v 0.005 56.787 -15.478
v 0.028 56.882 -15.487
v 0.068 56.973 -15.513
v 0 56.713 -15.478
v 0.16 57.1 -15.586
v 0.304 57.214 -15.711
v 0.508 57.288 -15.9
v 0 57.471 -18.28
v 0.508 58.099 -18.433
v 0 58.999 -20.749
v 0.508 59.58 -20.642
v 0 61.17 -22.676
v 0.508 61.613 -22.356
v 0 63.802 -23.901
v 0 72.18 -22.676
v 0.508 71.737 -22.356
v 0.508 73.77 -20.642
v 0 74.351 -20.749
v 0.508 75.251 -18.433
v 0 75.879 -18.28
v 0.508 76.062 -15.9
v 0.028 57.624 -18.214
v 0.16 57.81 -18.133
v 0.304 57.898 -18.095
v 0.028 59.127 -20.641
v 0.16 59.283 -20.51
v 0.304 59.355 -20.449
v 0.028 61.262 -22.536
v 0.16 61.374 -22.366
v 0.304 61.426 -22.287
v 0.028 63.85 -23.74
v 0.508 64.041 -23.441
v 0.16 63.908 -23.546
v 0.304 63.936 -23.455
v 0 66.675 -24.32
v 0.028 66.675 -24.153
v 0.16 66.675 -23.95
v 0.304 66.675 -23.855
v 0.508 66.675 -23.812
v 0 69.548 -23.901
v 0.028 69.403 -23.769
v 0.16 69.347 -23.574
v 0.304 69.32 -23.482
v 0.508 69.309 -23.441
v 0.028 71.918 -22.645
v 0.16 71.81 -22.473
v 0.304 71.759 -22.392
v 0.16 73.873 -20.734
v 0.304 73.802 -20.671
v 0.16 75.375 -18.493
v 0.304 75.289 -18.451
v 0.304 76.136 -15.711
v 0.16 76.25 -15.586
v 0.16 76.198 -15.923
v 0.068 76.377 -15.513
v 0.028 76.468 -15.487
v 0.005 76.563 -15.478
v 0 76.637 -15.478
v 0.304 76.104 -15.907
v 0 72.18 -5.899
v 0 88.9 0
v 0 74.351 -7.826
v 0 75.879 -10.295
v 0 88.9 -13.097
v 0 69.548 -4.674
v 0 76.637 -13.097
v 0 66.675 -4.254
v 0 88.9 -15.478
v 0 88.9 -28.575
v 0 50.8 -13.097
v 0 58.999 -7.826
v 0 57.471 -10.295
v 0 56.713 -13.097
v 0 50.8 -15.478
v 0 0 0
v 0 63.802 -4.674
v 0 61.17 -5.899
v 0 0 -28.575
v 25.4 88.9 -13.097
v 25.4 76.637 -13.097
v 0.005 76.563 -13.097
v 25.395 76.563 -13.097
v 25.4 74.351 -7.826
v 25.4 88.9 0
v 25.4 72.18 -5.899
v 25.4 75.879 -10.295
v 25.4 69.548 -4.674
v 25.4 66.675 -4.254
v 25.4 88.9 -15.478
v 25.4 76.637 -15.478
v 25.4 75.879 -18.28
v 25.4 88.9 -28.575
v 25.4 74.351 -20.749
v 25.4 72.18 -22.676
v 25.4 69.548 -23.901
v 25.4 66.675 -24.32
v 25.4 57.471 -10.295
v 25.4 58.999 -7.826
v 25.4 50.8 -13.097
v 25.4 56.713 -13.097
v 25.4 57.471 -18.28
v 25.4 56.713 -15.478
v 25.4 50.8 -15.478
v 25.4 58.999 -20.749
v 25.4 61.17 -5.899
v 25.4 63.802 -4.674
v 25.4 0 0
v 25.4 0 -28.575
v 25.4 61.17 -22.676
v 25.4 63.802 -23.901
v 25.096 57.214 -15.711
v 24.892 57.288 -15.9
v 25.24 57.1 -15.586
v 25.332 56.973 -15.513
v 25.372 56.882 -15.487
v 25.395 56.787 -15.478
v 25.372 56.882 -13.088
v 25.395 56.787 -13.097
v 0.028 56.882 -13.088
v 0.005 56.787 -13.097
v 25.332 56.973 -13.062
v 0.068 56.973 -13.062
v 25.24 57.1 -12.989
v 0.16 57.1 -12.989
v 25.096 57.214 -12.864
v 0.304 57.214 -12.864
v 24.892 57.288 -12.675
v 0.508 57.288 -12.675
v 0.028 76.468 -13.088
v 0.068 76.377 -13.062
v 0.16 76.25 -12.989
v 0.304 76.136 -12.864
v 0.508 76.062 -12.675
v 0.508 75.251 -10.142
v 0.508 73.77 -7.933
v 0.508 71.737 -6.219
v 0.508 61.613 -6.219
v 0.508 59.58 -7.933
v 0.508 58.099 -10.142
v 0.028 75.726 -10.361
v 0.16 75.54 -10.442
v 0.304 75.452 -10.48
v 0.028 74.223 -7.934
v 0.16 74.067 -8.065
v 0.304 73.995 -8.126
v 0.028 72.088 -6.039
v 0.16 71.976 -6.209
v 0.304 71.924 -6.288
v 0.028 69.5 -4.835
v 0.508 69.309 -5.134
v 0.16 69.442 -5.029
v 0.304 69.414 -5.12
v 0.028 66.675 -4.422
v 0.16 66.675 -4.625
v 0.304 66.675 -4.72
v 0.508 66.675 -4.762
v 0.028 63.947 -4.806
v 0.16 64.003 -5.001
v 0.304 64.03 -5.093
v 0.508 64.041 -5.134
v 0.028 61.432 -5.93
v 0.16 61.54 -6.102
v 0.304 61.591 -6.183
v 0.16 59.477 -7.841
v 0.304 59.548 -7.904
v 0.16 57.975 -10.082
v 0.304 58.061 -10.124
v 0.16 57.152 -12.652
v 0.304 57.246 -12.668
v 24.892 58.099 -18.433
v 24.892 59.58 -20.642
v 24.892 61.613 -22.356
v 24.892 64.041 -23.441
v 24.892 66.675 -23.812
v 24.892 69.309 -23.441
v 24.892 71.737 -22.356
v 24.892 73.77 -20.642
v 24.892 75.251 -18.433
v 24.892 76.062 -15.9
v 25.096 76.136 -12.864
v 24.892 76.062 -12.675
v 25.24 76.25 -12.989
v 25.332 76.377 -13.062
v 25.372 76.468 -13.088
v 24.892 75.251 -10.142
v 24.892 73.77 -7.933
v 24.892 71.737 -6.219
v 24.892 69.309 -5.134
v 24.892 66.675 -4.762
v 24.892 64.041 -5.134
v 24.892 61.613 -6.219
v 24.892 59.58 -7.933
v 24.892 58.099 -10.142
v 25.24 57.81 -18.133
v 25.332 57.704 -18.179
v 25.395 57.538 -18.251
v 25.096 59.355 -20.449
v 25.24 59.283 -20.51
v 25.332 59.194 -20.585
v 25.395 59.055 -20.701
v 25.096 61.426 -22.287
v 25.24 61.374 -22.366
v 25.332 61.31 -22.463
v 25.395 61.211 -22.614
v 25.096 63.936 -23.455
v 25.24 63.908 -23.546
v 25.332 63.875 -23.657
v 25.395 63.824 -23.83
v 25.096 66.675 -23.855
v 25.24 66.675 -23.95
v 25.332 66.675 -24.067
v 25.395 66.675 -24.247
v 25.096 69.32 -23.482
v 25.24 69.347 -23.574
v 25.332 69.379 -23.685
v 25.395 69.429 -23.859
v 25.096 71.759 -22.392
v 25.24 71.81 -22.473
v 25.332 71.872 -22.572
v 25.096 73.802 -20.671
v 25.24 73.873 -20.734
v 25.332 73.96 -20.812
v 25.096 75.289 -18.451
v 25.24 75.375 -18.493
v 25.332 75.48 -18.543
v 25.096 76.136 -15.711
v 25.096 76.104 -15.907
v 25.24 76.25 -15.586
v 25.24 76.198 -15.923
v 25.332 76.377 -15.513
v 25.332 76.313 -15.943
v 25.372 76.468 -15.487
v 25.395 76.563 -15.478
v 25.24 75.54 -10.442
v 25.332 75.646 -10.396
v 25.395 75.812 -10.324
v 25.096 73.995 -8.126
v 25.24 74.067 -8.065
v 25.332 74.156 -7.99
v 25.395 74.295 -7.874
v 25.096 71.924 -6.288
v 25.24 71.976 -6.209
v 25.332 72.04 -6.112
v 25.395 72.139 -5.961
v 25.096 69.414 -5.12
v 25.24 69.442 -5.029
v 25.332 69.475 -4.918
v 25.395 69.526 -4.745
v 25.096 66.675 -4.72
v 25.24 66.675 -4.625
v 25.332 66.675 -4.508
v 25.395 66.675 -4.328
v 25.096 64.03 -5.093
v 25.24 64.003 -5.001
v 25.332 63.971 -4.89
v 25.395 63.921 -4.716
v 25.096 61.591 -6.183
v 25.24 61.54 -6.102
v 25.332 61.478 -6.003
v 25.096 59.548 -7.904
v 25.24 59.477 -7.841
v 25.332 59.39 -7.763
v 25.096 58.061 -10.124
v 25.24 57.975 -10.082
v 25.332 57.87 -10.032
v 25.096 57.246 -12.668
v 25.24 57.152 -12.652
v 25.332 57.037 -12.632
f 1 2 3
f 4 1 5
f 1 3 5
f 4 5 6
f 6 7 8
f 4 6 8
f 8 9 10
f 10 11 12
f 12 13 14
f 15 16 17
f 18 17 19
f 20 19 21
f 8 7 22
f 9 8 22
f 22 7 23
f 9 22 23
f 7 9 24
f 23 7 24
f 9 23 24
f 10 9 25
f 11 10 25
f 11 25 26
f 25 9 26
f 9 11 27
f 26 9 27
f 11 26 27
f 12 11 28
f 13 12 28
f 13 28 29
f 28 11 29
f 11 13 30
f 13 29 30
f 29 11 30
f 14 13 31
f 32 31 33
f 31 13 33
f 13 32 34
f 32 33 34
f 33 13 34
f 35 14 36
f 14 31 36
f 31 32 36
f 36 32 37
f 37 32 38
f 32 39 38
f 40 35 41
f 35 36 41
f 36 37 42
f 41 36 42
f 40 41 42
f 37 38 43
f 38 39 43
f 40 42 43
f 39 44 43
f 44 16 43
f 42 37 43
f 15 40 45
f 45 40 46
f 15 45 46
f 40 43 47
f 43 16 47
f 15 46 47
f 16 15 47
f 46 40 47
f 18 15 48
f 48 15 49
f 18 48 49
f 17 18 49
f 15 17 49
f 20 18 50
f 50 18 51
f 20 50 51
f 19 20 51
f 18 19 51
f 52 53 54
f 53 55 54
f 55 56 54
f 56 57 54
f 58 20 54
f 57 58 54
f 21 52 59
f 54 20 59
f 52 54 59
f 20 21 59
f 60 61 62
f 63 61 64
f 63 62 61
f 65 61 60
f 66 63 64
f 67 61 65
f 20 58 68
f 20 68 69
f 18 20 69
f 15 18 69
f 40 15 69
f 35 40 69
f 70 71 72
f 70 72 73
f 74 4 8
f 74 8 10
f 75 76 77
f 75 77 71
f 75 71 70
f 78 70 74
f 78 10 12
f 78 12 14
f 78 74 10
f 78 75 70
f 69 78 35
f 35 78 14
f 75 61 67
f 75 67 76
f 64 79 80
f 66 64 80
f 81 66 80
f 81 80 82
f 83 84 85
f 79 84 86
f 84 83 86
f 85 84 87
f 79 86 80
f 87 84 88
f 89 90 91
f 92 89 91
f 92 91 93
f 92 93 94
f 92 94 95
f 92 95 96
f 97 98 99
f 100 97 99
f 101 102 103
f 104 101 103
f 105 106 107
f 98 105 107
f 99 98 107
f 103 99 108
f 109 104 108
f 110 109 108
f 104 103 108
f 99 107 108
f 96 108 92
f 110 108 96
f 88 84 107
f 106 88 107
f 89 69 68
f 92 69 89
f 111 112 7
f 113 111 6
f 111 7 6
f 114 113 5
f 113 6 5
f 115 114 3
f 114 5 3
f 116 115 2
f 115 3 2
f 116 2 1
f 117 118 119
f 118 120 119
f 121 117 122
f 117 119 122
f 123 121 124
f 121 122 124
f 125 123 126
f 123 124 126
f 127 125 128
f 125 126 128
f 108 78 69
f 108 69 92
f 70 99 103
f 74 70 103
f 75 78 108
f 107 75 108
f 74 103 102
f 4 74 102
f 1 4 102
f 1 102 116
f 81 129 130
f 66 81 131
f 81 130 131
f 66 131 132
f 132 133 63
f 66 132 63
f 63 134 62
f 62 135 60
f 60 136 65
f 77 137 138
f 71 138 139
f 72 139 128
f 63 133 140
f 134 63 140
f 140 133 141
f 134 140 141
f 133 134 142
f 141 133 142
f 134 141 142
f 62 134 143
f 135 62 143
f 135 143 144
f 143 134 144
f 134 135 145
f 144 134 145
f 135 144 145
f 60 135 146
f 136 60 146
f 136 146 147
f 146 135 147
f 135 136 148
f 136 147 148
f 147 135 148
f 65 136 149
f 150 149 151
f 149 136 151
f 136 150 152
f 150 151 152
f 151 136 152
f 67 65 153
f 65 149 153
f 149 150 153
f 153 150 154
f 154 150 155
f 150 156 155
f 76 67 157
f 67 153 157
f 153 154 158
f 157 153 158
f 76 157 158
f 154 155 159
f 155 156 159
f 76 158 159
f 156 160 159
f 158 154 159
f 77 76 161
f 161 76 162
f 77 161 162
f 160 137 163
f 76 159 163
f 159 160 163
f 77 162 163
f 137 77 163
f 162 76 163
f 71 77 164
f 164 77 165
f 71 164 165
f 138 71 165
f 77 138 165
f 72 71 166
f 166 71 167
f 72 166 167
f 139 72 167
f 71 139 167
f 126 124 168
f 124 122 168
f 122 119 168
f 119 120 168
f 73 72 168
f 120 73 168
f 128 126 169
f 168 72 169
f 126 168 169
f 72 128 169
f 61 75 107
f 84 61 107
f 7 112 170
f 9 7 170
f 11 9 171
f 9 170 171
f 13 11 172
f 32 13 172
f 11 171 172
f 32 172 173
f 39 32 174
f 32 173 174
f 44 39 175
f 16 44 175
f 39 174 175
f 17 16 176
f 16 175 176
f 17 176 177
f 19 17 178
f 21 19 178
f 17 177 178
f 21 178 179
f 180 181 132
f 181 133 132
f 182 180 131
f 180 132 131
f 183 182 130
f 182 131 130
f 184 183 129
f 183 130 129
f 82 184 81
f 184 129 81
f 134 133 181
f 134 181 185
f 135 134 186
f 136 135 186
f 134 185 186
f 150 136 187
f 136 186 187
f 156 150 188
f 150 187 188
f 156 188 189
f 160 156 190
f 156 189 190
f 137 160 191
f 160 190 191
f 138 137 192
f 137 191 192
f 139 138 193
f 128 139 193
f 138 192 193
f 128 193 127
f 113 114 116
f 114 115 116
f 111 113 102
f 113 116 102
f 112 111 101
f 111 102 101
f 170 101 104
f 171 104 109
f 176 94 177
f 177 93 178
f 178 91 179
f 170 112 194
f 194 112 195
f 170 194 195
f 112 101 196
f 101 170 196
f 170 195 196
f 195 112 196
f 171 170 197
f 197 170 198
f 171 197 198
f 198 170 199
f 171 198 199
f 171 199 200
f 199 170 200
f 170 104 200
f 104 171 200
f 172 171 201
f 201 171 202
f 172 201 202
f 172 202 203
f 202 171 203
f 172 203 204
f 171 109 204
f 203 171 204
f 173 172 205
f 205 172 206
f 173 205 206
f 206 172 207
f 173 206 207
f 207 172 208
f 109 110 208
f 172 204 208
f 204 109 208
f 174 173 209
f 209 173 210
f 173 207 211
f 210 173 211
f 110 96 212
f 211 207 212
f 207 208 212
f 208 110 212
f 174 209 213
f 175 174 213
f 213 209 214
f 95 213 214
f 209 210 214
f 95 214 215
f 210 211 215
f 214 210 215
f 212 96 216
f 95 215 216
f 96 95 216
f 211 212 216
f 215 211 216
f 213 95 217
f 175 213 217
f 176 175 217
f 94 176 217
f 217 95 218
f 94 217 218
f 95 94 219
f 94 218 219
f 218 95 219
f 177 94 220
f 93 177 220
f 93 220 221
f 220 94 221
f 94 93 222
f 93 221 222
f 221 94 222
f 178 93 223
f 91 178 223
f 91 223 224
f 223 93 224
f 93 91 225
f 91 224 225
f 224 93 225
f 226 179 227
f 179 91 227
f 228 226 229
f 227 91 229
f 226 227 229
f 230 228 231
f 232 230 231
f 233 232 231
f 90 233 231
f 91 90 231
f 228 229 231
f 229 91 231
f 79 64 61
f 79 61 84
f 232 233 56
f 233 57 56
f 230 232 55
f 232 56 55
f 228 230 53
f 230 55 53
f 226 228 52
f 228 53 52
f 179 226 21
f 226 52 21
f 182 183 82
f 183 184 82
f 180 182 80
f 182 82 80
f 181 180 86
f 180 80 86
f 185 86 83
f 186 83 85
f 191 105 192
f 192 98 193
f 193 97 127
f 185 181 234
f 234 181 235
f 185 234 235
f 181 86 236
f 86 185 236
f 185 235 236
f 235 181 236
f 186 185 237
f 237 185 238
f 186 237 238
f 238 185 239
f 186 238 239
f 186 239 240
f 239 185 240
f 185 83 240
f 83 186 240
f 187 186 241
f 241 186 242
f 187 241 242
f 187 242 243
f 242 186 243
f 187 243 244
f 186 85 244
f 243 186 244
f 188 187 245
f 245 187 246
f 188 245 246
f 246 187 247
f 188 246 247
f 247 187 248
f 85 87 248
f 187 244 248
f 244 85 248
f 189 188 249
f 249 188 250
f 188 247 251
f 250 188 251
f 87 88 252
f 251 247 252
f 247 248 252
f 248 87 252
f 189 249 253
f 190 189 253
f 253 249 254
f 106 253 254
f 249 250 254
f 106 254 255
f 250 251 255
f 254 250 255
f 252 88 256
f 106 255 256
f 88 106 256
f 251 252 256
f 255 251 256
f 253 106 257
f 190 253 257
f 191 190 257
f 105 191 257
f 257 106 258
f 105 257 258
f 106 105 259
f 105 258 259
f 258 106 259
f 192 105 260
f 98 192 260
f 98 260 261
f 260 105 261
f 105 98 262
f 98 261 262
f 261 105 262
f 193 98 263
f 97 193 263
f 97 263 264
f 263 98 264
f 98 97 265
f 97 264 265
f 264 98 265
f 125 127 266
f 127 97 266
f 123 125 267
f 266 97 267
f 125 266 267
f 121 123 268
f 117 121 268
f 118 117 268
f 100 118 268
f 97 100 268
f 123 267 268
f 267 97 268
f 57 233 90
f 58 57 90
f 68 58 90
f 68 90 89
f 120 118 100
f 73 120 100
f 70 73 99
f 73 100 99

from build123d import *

# Parameters (mm, degrees)
SKETCH1_W           = 25.4
SKETCH1_H           = 28.575
BOSS_EXTRUDE1_DEPTH = 88.9
CUT_EXTRUDE1_REACH  = 98.772
FILLET1_R           = 0.508


with BuildPart() as part:
    # Sketch1 → Boss-Extrude1 (new body)
    with BuildSketch(Plane(origin=(0, 0, 0), x_dir=(1, 0, 0), z_dir=(0, 1, 0))):
        with Locations((12.7, 14.2875)):
            Rectangle(SKETCH1_W, SKETCH1_H)
    extrude(amount=BOSS_EXTRUDE1_DEPTH)

    # Sketch2 → Cut-Extrude1 (cut, up to next)
    with BuildSketch(Plane(origin=(25.4, 0, 0), x_dir=(0, 0, -1), z_dir=(1, 0, 0)), mode=Mode.PRIVATE) as cut_extrude1_sk1:
        with BuildLine():
            Line((13.096875, 50.8), (15.478125, 50.8))
            Line((15.478125, 50.8), (15.478125, 57.224707036))
            ThreePointArc((15.478125, 57.224707036), (23.8125, 66.675), (15.478125, 76.125292964))
            Line((15.478125, 76.125292964), (15.478125, 88.9))
            Line((15.478125, 88.9), (13.096875, 88.9))
            Line((13.096875, 88.9), (13.096875, 76.125292964))
            ThreePointArc((13.096875, 76.125292964), (4.7625, 66.675), (13.096875, 57.224707036))
            Line((13.096875, 57.224707036), (13.096875, 50.8))
        make_face()
    cut_extrude1_tool1 = extrude(cut_extrude1_sk1.sketch, amount=-CUT_EXTRUDE1_REACH, mode=Mode.PRIVATE) & part.part
    add(cut_extrude1_tool1.solids().sort_by_distance((25.4, 67.546559, -14.2875))[0], mode=Mode.SUBTRACT)

    # Fillet1
    fillet1_edges = [part.edges().sort_by_distance(p)[0] for p in [
        (12.7, 57.224707036, -13.096875),
        (12.7, 76.125292964, -13.096875),
        (12.7, 76.125292964, -15.478125),
        (12.7, 57.224707036, -15.478125),
        (25.4, 66.675, -23.8125),
        (25.4, 66.675, -4.7625),
        (0, 66.675, -4.7625),
        (0, 66.675, -23.8125),
    ]]
    fillet(fillet1_edges, radius=FILLET1_R)


solid = part.part
